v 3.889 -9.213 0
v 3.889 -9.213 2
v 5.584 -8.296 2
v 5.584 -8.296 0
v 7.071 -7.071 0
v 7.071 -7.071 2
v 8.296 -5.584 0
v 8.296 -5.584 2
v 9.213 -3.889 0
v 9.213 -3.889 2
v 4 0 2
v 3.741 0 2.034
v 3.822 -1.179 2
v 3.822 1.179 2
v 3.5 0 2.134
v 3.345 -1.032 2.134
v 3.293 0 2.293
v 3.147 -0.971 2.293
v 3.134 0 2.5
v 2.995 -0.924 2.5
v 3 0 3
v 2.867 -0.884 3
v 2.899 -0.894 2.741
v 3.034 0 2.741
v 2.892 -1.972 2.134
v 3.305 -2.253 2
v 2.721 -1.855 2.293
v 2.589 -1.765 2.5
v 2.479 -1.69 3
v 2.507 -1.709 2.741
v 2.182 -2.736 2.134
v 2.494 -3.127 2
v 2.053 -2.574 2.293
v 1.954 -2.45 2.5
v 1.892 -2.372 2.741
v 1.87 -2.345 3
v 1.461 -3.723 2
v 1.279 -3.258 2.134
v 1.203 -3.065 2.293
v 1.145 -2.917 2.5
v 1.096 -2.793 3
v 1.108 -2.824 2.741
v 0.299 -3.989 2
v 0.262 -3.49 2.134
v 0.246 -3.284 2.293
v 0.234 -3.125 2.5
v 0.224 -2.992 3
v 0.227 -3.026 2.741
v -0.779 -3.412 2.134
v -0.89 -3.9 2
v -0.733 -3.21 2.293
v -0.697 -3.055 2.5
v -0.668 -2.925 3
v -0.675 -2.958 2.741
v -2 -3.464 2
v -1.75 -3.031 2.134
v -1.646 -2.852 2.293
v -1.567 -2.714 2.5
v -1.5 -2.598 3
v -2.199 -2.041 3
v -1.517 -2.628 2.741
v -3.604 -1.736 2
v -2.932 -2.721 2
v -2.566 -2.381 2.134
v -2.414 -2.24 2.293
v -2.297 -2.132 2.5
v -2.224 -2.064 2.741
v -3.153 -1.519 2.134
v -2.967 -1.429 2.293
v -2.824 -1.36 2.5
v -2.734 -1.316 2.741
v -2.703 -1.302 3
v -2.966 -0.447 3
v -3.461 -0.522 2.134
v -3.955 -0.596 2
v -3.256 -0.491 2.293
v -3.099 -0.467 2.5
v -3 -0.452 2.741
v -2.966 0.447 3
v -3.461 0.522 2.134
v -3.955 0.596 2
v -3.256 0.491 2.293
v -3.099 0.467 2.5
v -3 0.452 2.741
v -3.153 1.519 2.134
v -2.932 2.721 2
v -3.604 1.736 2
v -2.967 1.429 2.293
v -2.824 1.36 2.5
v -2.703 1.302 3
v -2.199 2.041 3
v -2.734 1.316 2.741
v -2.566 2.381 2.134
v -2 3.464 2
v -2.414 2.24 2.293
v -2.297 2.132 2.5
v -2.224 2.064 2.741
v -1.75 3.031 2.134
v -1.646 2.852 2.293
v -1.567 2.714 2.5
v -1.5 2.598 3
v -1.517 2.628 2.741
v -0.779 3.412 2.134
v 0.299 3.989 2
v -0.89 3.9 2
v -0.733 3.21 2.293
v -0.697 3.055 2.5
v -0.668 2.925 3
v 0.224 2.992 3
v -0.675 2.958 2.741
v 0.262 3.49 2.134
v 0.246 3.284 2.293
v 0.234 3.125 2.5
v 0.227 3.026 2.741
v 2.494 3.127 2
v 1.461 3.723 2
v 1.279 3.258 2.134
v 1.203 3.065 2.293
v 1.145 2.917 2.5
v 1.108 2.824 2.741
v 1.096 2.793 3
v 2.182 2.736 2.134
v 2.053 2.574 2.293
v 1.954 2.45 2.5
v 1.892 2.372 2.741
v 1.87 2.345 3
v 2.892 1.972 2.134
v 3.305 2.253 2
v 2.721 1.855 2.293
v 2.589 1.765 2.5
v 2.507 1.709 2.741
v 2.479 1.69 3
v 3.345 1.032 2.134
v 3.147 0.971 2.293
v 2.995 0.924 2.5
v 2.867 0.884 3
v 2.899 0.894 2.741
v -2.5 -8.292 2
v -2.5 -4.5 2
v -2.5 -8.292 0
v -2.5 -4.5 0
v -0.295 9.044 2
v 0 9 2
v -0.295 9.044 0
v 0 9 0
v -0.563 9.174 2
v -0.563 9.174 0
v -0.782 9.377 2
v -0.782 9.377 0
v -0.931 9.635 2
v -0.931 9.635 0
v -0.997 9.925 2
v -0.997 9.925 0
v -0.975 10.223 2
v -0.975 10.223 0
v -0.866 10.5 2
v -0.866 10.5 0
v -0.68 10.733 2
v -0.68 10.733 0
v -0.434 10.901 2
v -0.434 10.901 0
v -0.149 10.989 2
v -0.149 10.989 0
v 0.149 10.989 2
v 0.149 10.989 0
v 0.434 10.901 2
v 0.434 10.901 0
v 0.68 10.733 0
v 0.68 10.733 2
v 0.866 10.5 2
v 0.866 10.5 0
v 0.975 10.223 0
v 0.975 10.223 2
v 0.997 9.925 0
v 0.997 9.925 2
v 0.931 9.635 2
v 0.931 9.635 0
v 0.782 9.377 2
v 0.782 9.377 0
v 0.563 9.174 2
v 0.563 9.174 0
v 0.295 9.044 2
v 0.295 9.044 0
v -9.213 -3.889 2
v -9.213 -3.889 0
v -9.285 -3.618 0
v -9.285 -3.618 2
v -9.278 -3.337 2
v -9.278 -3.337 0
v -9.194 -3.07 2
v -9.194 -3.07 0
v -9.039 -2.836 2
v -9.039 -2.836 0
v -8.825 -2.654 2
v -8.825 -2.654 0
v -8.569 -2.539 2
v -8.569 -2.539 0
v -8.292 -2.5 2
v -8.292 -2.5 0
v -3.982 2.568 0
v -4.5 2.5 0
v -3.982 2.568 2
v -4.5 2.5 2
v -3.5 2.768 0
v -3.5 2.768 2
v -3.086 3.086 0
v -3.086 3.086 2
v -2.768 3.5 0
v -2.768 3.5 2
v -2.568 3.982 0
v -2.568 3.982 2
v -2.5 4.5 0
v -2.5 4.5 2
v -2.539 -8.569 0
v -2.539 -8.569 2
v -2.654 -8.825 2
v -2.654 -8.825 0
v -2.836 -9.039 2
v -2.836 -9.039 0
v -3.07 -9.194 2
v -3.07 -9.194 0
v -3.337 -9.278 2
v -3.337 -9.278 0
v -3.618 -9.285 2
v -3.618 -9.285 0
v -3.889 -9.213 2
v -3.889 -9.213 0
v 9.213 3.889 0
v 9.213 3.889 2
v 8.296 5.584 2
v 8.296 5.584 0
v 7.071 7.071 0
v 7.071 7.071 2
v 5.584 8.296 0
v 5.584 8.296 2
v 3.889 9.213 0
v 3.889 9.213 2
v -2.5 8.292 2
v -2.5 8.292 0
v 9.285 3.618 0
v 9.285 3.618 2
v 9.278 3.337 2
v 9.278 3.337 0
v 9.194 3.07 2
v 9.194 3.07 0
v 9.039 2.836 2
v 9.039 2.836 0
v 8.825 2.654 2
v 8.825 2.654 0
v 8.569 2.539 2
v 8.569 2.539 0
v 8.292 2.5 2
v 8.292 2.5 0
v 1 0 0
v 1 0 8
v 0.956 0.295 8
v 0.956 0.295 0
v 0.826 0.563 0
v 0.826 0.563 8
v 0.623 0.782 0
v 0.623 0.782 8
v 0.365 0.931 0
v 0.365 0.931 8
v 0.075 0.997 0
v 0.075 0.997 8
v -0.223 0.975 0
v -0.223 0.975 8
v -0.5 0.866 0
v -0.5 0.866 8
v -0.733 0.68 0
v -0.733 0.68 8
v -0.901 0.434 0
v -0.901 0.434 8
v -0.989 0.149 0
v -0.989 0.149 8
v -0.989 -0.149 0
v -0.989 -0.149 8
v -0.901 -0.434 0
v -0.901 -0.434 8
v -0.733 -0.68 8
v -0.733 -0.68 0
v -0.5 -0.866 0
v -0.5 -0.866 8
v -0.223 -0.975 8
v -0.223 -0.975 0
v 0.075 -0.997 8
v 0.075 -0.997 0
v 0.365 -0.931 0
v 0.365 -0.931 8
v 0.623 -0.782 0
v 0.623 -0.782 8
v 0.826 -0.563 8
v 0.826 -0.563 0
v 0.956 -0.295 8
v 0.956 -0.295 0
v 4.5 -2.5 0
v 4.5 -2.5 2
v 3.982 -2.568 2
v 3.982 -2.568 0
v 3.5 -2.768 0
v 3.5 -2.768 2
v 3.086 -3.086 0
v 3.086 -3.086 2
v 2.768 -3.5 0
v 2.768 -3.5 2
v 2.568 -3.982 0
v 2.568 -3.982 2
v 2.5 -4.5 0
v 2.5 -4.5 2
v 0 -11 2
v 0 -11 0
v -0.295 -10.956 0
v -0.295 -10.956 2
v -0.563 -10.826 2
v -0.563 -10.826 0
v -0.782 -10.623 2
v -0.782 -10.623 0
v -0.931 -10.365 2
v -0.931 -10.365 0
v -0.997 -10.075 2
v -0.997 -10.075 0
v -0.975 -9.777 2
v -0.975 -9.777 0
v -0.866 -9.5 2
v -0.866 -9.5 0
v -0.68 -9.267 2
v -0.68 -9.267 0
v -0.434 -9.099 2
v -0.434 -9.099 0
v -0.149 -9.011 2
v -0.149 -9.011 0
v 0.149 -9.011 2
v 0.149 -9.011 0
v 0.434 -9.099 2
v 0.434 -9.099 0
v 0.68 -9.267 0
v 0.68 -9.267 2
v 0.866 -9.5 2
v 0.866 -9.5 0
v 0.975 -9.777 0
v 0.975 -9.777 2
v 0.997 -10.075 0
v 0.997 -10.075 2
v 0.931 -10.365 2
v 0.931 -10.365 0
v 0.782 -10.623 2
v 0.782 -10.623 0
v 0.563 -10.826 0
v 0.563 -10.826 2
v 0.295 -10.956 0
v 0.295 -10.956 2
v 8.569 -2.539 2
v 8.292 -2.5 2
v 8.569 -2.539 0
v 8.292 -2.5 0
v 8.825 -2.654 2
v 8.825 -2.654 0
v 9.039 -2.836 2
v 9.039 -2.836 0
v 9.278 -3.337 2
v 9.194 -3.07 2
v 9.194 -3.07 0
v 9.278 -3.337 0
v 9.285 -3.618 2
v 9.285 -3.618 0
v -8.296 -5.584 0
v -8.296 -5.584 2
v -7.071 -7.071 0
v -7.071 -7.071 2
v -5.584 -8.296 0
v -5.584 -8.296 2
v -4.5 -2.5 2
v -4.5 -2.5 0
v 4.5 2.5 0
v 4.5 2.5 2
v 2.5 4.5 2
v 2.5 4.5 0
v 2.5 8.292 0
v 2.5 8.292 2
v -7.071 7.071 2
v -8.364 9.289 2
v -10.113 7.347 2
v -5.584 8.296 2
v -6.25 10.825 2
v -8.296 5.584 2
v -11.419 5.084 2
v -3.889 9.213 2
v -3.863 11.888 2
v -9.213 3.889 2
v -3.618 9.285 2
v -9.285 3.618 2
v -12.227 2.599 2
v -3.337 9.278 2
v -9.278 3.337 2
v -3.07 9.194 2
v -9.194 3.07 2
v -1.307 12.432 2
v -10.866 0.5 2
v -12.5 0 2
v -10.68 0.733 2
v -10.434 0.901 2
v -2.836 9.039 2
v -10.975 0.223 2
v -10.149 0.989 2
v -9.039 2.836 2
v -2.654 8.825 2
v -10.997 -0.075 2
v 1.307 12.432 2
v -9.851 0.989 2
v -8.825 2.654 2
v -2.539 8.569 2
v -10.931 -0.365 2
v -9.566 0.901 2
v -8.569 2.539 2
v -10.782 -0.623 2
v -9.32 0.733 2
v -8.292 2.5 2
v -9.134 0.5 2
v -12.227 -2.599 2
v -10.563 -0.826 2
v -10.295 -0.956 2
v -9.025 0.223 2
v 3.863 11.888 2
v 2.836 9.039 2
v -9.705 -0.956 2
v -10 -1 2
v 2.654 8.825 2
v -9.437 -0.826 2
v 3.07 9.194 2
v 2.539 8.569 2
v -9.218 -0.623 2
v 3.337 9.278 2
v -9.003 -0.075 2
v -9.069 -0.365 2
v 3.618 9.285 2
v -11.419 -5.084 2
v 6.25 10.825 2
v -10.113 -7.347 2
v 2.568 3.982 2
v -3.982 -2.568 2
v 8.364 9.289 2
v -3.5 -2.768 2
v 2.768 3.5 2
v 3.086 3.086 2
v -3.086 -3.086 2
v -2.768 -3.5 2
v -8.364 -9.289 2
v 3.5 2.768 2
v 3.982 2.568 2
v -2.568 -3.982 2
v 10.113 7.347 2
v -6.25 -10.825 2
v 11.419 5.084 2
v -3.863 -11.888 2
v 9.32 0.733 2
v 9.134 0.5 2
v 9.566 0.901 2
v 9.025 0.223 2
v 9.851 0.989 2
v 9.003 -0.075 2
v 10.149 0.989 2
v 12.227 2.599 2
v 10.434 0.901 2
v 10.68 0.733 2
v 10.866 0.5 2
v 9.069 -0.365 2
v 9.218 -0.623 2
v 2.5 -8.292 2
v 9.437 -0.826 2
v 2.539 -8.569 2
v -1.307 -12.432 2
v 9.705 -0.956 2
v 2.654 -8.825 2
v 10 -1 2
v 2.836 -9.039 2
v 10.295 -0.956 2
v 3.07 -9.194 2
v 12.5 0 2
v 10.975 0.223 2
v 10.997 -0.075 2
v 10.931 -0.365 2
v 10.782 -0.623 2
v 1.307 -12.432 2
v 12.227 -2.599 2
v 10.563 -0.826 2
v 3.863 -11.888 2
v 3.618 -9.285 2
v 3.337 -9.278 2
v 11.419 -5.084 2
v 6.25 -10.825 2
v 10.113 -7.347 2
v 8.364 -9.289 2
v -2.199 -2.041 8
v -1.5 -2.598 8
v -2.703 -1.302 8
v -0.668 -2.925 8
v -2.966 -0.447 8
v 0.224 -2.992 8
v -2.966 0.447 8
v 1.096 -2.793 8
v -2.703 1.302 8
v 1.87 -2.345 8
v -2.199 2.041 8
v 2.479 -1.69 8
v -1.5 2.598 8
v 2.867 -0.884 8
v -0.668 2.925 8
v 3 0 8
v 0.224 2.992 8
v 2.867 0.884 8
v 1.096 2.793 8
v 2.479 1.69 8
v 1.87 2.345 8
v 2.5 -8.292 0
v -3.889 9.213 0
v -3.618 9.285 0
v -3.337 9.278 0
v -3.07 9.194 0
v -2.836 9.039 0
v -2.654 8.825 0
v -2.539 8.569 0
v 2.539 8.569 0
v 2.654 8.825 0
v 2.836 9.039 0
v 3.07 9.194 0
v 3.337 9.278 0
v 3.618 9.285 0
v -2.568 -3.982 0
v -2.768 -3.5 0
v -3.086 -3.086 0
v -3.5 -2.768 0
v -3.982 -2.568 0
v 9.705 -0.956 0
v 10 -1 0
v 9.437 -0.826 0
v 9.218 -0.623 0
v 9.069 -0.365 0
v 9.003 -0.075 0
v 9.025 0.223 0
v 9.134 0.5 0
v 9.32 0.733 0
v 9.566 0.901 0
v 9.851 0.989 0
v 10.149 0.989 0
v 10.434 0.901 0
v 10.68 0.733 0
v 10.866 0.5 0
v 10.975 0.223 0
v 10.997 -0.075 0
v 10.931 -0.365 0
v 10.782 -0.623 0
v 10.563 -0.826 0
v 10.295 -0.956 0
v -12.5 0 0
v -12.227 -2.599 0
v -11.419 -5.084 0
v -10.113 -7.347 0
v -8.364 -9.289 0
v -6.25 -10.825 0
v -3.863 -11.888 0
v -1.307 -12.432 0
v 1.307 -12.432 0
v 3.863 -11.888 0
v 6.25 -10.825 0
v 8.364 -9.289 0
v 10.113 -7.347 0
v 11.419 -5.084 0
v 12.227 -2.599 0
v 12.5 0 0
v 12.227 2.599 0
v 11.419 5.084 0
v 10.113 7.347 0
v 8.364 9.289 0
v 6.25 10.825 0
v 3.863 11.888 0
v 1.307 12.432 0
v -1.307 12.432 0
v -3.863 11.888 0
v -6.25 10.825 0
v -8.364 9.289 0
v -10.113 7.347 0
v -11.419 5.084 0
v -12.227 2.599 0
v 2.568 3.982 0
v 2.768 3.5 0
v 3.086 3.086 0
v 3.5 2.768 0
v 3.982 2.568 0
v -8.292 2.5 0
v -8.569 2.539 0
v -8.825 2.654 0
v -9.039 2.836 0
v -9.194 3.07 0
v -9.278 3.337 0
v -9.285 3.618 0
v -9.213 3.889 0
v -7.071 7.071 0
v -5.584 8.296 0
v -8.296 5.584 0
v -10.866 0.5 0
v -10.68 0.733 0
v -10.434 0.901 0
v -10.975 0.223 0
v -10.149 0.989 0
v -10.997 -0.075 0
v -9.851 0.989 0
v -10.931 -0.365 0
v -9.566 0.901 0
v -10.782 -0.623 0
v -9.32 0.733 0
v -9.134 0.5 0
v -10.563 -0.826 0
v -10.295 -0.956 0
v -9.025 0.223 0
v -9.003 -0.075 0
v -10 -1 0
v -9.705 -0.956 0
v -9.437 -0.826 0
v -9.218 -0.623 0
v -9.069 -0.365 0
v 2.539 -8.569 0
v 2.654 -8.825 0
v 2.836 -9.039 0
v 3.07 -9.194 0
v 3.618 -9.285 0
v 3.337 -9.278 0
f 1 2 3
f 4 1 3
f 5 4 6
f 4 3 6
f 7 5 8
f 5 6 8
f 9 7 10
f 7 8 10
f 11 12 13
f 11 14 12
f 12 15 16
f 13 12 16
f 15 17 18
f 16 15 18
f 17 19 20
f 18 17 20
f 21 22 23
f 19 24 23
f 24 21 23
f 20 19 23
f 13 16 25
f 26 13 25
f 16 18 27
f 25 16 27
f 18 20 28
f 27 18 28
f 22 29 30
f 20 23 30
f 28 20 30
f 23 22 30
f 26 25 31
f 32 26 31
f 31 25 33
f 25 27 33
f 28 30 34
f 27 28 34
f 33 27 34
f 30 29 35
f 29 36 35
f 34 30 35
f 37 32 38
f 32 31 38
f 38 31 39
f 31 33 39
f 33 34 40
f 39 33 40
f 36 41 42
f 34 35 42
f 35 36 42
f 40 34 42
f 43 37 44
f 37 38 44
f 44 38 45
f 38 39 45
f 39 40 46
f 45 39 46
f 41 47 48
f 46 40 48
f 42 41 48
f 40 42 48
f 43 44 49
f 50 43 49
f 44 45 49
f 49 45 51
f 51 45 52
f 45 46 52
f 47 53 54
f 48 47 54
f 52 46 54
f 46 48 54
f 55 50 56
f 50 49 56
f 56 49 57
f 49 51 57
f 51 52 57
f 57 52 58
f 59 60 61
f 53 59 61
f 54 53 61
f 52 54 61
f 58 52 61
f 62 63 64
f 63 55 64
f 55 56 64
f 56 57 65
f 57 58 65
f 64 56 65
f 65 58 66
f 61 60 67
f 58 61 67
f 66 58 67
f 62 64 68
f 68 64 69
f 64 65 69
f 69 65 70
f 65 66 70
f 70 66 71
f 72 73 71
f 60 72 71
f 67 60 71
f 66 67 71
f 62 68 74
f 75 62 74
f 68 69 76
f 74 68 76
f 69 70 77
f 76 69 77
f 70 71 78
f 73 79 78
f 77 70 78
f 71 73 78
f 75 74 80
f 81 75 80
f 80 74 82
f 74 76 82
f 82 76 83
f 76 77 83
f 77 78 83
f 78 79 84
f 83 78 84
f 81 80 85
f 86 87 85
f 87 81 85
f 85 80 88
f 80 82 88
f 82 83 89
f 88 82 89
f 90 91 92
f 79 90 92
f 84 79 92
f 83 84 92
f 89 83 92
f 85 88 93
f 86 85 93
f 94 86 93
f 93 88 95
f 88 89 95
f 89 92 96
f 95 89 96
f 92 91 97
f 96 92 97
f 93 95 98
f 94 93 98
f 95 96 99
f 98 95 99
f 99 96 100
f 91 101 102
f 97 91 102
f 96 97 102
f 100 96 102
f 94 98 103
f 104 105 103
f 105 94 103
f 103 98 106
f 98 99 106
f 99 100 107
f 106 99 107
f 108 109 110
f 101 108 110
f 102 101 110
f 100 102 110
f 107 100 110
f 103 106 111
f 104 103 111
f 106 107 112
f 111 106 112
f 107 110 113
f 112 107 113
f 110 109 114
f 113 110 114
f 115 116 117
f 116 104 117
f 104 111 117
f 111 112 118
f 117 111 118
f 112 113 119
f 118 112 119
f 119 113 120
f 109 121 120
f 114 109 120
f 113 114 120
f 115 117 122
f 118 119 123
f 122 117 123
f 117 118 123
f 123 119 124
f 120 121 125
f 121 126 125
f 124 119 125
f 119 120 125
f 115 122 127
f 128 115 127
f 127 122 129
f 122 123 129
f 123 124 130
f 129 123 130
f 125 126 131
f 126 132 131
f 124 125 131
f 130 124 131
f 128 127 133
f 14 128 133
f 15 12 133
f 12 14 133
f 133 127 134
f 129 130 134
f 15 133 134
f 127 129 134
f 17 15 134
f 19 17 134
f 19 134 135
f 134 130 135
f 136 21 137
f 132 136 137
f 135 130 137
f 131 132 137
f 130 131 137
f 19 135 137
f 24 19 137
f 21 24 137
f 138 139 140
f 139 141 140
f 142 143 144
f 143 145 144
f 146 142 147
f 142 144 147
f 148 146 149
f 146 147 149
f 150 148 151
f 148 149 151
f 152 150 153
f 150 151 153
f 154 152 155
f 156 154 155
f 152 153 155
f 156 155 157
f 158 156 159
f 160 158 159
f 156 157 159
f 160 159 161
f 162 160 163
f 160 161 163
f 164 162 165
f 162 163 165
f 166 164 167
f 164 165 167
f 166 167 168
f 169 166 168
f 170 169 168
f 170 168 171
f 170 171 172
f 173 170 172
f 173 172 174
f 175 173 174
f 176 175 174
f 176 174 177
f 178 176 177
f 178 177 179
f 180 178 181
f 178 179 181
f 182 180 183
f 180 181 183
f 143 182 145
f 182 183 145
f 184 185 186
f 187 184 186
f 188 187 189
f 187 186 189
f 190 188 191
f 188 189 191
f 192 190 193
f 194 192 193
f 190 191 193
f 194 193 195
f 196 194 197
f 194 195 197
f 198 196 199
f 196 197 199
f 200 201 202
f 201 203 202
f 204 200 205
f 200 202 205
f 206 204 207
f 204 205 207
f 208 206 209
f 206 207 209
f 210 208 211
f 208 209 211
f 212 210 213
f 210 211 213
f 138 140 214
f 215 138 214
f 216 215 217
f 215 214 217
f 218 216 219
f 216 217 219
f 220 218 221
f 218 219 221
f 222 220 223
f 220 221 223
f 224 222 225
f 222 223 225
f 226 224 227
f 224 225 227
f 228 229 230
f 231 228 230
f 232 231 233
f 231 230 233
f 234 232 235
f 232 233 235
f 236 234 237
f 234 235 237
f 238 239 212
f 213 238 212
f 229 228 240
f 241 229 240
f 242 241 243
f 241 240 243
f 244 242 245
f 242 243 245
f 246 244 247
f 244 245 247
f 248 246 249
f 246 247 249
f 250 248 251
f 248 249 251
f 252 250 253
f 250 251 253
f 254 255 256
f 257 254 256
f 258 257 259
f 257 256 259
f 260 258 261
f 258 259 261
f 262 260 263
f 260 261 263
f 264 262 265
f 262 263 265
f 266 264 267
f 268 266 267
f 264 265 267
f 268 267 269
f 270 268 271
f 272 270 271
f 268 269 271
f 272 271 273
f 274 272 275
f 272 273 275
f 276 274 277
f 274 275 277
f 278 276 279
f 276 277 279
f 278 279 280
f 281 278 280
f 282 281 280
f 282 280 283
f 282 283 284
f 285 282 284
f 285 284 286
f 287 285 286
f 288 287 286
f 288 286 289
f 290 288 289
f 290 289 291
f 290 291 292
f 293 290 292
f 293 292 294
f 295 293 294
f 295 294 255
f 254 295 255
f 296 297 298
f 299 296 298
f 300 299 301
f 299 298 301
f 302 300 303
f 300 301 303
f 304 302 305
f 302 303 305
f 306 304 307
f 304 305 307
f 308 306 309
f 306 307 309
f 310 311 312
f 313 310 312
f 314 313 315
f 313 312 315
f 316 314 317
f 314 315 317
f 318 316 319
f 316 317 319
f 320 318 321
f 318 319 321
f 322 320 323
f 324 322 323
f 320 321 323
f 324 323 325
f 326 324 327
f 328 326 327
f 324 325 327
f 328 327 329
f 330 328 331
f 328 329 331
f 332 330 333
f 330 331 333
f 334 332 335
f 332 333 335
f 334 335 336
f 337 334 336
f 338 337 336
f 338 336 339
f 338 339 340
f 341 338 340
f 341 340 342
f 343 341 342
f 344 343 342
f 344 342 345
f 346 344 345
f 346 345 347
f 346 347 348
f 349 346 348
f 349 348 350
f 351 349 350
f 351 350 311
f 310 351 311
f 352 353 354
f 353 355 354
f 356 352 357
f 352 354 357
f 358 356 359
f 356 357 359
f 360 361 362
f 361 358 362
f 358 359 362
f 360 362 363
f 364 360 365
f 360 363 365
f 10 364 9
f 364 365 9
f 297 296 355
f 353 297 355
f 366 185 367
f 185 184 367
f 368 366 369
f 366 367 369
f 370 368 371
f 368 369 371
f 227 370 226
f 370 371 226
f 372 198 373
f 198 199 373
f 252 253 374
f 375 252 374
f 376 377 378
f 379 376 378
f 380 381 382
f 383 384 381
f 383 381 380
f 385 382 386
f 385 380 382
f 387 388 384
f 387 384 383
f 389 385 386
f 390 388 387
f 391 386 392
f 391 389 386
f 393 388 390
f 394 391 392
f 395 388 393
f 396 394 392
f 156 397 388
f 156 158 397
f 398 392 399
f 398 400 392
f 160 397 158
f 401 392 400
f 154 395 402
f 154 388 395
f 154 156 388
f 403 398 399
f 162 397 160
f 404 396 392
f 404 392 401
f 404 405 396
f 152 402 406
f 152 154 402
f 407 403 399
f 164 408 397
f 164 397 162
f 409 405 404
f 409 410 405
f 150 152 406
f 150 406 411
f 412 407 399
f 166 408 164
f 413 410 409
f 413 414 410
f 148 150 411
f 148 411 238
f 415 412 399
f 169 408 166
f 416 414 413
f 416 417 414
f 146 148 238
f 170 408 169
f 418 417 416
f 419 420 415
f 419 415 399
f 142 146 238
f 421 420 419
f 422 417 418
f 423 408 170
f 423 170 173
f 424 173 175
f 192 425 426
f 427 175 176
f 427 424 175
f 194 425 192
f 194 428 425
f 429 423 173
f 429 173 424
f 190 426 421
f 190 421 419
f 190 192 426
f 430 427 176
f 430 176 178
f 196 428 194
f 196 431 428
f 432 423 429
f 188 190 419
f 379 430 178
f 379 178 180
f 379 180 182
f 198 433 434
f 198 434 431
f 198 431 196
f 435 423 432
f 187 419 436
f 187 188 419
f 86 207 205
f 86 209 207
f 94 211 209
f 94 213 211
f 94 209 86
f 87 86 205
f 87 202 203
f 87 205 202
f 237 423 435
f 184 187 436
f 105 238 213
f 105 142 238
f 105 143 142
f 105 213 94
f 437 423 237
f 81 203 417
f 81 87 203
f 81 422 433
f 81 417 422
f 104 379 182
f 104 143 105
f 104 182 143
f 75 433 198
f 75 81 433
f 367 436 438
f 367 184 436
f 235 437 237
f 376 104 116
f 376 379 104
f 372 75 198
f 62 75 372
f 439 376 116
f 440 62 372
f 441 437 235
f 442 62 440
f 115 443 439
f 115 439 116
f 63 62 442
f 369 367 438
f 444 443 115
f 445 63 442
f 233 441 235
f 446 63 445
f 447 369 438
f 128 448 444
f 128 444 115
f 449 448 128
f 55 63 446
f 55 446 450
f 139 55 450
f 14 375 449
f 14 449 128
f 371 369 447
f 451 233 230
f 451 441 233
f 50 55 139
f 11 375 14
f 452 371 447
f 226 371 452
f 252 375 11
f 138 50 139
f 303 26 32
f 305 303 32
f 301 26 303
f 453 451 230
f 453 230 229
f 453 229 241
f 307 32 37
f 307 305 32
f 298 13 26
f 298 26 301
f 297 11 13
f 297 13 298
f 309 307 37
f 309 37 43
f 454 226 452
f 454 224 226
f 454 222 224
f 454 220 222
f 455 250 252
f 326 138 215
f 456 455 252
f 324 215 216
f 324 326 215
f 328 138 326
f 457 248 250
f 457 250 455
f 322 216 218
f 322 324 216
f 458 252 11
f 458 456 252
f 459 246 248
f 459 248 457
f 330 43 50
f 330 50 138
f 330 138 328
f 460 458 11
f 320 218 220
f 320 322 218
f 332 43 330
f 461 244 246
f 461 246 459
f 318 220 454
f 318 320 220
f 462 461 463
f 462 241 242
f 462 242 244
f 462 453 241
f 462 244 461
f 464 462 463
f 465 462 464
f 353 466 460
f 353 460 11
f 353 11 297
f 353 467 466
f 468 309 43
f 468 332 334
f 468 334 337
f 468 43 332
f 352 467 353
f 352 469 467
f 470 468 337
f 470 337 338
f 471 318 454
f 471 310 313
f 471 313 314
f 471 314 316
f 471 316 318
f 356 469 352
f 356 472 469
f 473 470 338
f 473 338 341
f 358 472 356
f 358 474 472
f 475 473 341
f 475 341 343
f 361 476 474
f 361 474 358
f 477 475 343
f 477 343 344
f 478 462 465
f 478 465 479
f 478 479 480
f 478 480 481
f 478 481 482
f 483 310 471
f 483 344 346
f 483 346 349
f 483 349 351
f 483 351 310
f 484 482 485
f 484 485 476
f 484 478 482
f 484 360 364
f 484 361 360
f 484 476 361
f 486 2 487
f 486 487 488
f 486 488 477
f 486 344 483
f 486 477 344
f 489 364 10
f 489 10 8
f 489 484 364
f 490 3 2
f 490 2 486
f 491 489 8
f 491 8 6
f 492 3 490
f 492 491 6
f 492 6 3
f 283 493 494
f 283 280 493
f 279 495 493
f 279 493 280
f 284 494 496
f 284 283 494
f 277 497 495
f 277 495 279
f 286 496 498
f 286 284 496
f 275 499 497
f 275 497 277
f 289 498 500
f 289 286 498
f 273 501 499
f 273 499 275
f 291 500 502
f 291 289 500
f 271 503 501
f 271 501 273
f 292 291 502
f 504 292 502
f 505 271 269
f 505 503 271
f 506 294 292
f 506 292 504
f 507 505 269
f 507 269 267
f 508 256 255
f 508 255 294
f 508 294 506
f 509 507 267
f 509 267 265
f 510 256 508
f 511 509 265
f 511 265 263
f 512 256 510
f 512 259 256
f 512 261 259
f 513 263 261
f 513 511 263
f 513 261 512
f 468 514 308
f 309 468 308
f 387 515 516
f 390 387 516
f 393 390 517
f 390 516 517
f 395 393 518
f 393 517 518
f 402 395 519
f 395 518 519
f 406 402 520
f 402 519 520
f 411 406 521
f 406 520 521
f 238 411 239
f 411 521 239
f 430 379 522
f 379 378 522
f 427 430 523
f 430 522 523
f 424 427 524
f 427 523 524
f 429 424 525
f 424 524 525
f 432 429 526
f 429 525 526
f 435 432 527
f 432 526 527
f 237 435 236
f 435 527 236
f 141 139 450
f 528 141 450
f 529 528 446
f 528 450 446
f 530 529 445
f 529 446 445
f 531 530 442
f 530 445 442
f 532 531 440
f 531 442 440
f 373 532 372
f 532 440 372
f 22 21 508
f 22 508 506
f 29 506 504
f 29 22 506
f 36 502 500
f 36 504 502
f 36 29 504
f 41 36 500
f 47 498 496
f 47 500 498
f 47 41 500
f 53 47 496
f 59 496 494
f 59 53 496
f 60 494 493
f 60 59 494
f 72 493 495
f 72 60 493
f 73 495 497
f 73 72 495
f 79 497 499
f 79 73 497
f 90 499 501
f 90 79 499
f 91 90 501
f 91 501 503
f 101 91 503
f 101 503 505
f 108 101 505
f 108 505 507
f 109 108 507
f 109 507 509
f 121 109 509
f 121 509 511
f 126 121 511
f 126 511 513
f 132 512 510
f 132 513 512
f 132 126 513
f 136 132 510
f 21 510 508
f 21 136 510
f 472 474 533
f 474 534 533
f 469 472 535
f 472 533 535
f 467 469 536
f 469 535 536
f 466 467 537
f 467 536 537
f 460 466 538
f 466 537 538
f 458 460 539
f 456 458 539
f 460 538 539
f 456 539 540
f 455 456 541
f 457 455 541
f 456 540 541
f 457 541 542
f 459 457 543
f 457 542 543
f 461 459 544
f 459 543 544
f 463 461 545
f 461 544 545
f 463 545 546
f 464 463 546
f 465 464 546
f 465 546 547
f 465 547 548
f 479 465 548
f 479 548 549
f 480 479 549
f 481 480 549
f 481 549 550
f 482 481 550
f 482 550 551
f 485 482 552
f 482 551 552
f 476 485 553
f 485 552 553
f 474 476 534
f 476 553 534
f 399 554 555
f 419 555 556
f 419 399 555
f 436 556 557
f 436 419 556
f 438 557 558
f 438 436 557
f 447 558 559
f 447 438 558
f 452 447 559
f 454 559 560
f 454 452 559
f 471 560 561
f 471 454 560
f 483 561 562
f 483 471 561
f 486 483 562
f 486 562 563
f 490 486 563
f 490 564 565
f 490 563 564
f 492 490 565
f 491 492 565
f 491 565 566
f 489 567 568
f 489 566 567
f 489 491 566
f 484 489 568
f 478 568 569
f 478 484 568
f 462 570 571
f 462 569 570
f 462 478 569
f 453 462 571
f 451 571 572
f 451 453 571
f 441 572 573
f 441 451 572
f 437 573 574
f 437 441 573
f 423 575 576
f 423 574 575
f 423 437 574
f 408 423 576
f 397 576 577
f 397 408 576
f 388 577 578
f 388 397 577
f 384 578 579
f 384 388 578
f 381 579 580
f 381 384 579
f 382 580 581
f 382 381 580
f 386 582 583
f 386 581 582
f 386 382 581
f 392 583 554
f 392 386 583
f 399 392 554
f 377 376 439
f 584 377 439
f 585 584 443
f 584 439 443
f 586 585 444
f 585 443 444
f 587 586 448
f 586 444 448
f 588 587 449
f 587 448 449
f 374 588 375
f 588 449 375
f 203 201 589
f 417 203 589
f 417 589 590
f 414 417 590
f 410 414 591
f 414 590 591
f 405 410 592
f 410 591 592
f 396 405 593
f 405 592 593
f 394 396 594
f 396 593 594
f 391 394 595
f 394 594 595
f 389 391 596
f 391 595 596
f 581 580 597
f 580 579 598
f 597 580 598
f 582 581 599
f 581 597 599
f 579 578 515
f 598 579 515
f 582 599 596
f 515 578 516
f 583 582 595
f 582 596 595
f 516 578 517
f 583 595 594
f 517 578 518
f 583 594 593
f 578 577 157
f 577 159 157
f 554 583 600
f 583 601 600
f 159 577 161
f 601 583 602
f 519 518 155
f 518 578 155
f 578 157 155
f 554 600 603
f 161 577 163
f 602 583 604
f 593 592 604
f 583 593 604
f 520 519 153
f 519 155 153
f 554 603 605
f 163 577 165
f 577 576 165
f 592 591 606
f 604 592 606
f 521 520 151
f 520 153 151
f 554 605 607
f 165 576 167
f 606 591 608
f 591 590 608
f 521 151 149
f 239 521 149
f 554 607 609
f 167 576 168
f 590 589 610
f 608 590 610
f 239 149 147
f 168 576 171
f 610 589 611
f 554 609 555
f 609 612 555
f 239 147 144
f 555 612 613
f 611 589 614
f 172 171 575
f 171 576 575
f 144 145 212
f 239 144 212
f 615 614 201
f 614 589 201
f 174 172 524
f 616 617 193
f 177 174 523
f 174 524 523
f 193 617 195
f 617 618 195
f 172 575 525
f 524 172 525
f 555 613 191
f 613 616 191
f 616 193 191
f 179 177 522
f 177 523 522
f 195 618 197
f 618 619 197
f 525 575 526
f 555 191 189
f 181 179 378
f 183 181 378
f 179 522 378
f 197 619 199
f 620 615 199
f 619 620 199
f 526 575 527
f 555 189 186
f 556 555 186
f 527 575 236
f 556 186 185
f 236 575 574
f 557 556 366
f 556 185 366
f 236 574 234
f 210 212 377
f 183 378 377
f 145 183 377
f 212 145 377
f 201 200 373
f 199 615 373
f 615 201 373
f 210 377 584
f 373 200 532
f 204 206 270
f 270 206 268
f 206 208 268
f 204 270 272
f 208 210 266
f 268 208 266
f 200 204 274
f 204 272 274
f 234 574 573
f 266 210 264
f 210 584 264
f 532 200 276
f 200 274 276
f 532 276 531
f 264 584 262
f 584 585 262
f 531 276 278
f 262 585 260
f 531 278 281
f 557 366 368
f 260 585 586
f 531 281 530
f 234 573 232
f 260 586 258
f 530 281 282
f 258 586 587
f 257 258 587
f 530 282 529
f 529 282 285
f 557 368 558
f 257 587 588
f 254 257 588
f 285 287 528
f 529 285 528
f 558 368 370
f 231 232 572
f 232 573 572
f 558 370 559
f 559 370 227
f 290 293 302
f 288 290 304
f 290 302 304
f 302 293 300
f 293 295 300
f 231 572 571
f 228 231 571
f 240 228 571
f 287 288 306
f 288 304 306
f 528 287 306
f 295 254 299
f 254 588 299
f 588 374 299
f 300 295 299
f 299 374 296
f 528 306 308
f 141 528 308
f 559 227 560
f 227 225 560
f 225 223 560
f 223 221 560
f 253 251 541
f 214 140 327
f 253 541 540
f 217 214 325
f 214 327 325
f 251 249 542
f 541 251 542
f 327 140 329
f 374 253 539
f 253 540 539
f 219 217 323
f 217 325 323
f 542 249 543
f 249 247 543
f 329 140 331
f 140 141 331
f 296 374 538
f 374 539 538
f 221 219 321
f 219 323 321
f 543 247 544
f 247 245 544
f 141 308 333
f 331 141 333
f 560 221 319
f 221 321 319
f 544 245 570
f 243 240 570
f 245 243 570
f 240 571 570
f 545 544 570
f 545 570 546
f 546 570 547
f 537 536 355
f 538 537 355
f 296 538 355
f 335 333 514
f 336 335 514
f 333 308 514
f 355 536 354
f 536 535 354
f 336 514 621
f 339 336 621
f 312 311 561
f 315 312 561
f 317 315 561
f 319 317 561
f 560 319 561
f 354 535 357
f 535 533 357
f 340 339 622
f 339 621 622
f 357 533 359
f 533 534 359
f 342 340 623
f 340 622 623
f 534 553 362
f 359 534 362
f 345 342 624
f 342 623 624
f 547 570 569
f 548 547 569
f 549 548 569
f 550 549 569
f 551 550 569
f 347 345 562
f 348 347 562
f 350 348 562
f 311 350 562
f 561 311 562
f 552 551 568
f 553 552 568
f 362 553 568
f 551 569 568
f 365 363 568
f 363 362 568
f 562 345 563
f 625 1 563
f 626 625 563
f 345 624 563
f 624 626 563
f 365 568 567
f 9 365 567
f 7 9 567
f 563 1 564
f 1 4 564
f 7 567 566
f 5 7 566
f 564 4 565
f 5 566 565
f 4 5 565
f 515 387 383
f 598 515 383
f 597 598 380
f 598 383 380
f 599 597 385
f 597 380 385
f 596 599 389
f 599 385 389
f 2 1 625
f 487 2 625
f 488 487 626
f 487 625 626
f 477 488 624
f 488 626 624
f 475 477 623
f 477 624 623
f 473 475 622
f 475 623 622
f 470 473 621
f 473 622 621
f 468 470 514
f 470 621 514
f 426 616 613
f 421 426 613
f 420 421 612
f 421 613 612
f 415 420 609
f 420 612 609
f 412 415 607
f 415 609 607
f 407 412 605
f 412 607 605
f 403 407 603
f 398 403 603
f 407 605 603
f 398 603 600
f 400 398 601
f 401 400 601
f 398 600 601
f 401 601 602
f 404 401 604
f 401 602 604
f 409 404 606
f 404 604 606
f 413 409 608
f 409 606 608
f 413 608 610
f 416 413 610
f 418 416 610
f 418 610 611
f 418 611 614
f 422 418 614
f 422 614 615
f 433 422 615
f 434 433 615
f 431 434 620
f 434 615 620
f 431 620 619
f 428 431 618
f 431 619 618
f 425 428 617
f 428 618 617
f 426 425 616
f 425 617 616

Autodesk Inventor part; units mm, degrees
ref_plane "YZ Plane" through (0, 0, 0) normal (1, 0, 0) x (0, 1, 0)
ref_plane "XZ Plane" through (0, 0, 0) normal (0, 1, 0) x (-1, 0, 0)
ref_plane "XY Plane" through (0, 0, 0) normal (0, 0, 1) x (1, 0, 0)
sketch "Sketch1" plane through (0, 0, 0) normal (0, 0, 1) x (1, 0, 0)
  circle A0 centre (-10, 0) radius 1 projected
  circle A1 centre (0, 10) radius 1 projected
  circle A2 centre (0, -10) radius 1 projected
  circle A3 centre (10, 0) radius 1 projected
  circle A4 centre (0, 0) radius 1.5 projected
  arc A5 (10.8355, 3.8525) -> (3.8525, 10.8355) centre (0, 0) ccw projected
  arc A6 (9.4222, 1.85) -> (10.8355, 3.8525) centre (9.4222, 3.35) ccw projected
  line L0 (9.4222, 1.85) -> (3.35, 1.85) projected
  arc A7 (1.85, 3.35) -> (3.35, 1.85) centre (3.35, 3.35) ccw projected
  line L1 (1.85, 3.35) -> (1.85, 9.4222) projected
  arc A8 (3.8525, 10.8355) -> (1.85, 9.4222) centre (3.35, 9.4222) ccw projected
  line L2 (-1.85, 9.4222) -> (-1.85, 3.35) projected
  arc A9 (-3.35, 1.85) -> (-1.85, 3.35) centre (-3.35, 3.35) ccw projected
  line L3 (-3.35, 1.85) -> (-9.4222, 1.85) projected
  arc A10 (-10.8355, 3.8525) -> (-9.4222, 1.85) centre (-9.4222, 3.35) ccw projected
  arc A11 (-3.8525, 10.8355) -> (-10.8355, 3.8525) centre (0, 0) ccw projected
  arc A12 (-1.85, 9.4222) -> (-3.8525, 10.8355) centre (-3.35, 9.4222) ccw projected
  line L4 (3.35, -1.85) -> (9.4222, -1.85) projected
  arc A13 (10.8355, -3.8525) -> (9.4222, -1.85) centre (9.4222, -3.35) ccw projected
  arc A14 (3.8525, -10.8355) -> (10.8355, -3.8525) centre (0, 0) ccw projected
  arc A15 (1.85, -9.4222) -> (3.8525, -10.8355) centre (3.35, -9.4222) ccw projected
  line L5 (1.85, -9.4222) -> (1.85, -3.35) projected
  arc A16 (3.35, -1.85) -> (1.85, -3.35) centre (3.35, -3.35) ccw projected
  line L6 (-1.85, -3.35) -> (-1.85, -9.4222) projected
  arc A17 (-3.8525, -10.8355) -> (-1.85, -9.4222) centre (-3.35, -9.4222) ccw projected
  arc A18 (-10.8355, -3.8525) -> (-3.8525, -10.8355) centre (0, 0) ccw projected
  arc A19 (-9.4222, -1.85) -> (-10.8355, -3.8525) centre (-9.4222, -3.35) ccw projected
  line L7 (-9.4222, -1.85) -> (-3.35, -1.85) projected
  arc A20 (-1.85, -3.35) -> (-3.35, -1.85) centre (-3.35, -3.35) ccw projected
  circle A21 centre (0, 0) radius 12.55 projected
  line L8 (0, -10) -> (0, 10) construction
  line L9 (2.5, -10) -> (2.5, 10)
  line L10 (-2.5, 10) -> (-2.5, -10)
  arc A22 (-2.5, -10) -> (2.5, -10) centre (0, -10) ccw
  arc A23 (2.5, 10) -> (-2.5, 10) centre (0, 10) ccw
  line L11 (10, 0) -> (-10, 0) construction
  line L12 (10, 2.5) -> (-10, 2.5)
  line L13 (-10, -2.5) -> (10, -2.5)
  arc A24 (10, -2.5) -> (10, 2.5) centre (10, 0) ccw
  arc A25 (-10, 2.5) -> (-10, -2.5) centre (-10, 0) ccw
  point P0 (0, 0)
  point P1 (0, 0)
  point P2 (0, 0)
  point P3 (-2.5, -2.5)
  point P4 (2.5, -2.5)
  point P5 (2.5, 2.5)
  point P6 (-2.5, 2.5)
  dimension "d15" = 1
  dimension "d0" = 5
  dimension "d1" = 5
extrude "Extrusion1" add sketch "Sketch1" along normal blind 2 contours A0 | A1 | A2 | A3 | A4 | A24 A13 L4 A16 L9 A7 L0 A6 | A6 L0 A7 L9 L12 A24 | A23 L9 L12 A7 L1 A8 | A8 L1 A7 L12 A9 L2 A12 A23 | A24 L13 L9 A16 L4 A13 | A12 L2 A9 L12 L10 A23 | L9 A7 L12 | L9 A16 L13 A20 L10 A9 L12 A7 | L13 A16 L9 | L9 A22 A15 L5 A16 L13 | L12 A9 L10 | L10 A9 L3 A10 A25 L12 | A22 A17 L6 A20 L13 A16 L5 A15 | A10 L3 A9 L10 A20 L7 A19 A25 | A22 L10 L13 A20 L6 A17 | L13 L10 A20 | A19 L7 A20 L10 L13 A25
sketch "Sketch2" plane through (0, 0, 2) normal (0, 0, 1) x (1, 0, 0)
  line L0 (-2.5, -2.5) -> (-2.5, -10) projected
  arc A0 (-2.5, -10) -> (2.5, -10) centre (0, -10) ccw projected
  line L1 (2.5, -10) -> (2.5, -2.5) projected
  line L2 (2.5, -2.5) -> (10, -2.5) projected
  arc A1 (10, -2.5) -> (10, 2.5) centre (10, 0) ccw projected
  line L3 (10, 2.5) -> (2.5, 2.5) projected
  line L4 (2.5, 2.5) -> (2.5, 10) projected
  arc A2 (2.5, 10) -> (-2.5, 10) centre (0, 10) ccw projected
  line L5 (-2.5, 10) -> (-2.5, 2.5) projected
  line L6 (-2.5, 2.5) -> (-10, 2.5) projected
  arc A3 (-10, 2.5) -> (-10, -2.5) centre (-10, 0) ccw projected
  line L7 (-10, -2.5) -> (-2.5, -2.5) projected
  point P0 (0, 0)
hole "Hole1" at (0, -10, 2) at (10, 0, 2) at (0, 10, 2) at (-10, 0, 2) direction (0, 0, -1) diameter 2 depth 5
sketch "Sketch3" plane through (0, 0, 2) normal (0, 0, 1) x (1, 0, 0)
  circle A0 centre (0, 0) radius 3
  dimension "d11" = 6
extrude "Extrusion2" add sketch "Sketch3" along normal blind 6
fillet "Fillet1" radius 2 4 edges at (2.5, -2.5, 1) (-2.5, -2.5, 1) (-2.5, 2.5, 1) (2.5, 2.5, 1)
fillet "Fillet2" radius 1 1 edges at (-3, 0, 2)
sketch "Sketch4" plane through (0, 0, 8) normal (0, 0, 1) x (1, 0, 0)
  circle A0 centre (0, 0) radius 1
  dimension "d16" = 2
extrude "Extrusion3" cut sketch "Sketch4" against normal blind 12
sketch "Sketch5" plane through (0, 0, 2) normal (0, 0, 1) x (1, 0, 0)
  arc A0 (2.5, 10) -> (-2.5, 10) centre (0, 10) ccw projected
  line L0 (-2.5, 10) -> (-2.5, 4.5) projected
  arc A1 (-4.5, 2.5) -> (-2.5, 4.5) centre (-4.5, 4.5) ccw projected
  line L1 (-4.5, 2.5) -> (-10, 2.5) projected
  arc A2 (-10, 2.5) -> (-10, -2.5) centre (-10, 0) ccw projected
  line L2 (-10, -2.5) -> (-4.5, -2.5) projected
  arc A3 (-2.5, -4.5) -> (-4.5, -2.5) centre (-4.5, -4.5) ccw projected
  line L3 (-2.5, -4.5) -> (-2.5, -10) projected
  arc A4 (-2.5, -10) -> (2.5, -10) centre (0, -10) ccw projected
  line L4 (2.5, -10) -> (2.5, -4.5) projected
  arc A5 (4.5, -2.5) -> (2.5, -4.5) centre (4.5, -4.5) ccw projected
  line L5 (4.5, -2.5) -> (10, -2.5) projected
  arc A6 (10, -2.5) -> (10, 2.5) centre (10, 0) ccw projected
  line L6 (10, 2.5) -> (4.5, 2.5) projected
  arc A7 (2.5, 4.5) -> (4.5, 2.5) centre (4.5, 4.5) ccw projected
  line L7 (2.5, 4.5) -> (2.5, 10) projected
  circle A8 centre (-10, 0) radius 1 projected
  circle A9 centre (10, 0) radius 1 projected
  circle A10 centre (0, -10) radius 1 projected
  circle A11 centre (0, 10) radius 1 projected
  circle A12 centre (0, 0) radius 4 projected
  circle A13 centre (0, 0) radius 1 projected
  circle A14 centre (0, 0) radius 12.5
  circle A15 centre (0, 0) radius 10
  point P0 (-2.5, -9.6825)
  point P1 (-9.6825, -2.5)
  point P2 (-12.5, 0)
  point P3 (0, -12.5)
  dimension "d19" = 25
  dimension "d20" = 20
extrude "Extrusion4" add sketch "Sketch5" against normal blind 2 contours A2 L2 A15 L3 A4 A14
pattern_circular "Circular Pattern1" count 4 over 360 about axis through (0, 0, 2) along (0, 0, 1) of "Extrusion4"
fillet "Fillet3" radius 1 8 edges at (-2.5, -9.6825, 1) (-9.6825, -2.5, 1) (-9.6825, 2.5, 1) (-2.5, 9.6825, 1) (2.5, 9.6825, 1) (9.6825, 2.5, 1) (9.6825, -2.5, 1) (2.5, -9.6825, 1)
properties part number "tendon_wh_1"
